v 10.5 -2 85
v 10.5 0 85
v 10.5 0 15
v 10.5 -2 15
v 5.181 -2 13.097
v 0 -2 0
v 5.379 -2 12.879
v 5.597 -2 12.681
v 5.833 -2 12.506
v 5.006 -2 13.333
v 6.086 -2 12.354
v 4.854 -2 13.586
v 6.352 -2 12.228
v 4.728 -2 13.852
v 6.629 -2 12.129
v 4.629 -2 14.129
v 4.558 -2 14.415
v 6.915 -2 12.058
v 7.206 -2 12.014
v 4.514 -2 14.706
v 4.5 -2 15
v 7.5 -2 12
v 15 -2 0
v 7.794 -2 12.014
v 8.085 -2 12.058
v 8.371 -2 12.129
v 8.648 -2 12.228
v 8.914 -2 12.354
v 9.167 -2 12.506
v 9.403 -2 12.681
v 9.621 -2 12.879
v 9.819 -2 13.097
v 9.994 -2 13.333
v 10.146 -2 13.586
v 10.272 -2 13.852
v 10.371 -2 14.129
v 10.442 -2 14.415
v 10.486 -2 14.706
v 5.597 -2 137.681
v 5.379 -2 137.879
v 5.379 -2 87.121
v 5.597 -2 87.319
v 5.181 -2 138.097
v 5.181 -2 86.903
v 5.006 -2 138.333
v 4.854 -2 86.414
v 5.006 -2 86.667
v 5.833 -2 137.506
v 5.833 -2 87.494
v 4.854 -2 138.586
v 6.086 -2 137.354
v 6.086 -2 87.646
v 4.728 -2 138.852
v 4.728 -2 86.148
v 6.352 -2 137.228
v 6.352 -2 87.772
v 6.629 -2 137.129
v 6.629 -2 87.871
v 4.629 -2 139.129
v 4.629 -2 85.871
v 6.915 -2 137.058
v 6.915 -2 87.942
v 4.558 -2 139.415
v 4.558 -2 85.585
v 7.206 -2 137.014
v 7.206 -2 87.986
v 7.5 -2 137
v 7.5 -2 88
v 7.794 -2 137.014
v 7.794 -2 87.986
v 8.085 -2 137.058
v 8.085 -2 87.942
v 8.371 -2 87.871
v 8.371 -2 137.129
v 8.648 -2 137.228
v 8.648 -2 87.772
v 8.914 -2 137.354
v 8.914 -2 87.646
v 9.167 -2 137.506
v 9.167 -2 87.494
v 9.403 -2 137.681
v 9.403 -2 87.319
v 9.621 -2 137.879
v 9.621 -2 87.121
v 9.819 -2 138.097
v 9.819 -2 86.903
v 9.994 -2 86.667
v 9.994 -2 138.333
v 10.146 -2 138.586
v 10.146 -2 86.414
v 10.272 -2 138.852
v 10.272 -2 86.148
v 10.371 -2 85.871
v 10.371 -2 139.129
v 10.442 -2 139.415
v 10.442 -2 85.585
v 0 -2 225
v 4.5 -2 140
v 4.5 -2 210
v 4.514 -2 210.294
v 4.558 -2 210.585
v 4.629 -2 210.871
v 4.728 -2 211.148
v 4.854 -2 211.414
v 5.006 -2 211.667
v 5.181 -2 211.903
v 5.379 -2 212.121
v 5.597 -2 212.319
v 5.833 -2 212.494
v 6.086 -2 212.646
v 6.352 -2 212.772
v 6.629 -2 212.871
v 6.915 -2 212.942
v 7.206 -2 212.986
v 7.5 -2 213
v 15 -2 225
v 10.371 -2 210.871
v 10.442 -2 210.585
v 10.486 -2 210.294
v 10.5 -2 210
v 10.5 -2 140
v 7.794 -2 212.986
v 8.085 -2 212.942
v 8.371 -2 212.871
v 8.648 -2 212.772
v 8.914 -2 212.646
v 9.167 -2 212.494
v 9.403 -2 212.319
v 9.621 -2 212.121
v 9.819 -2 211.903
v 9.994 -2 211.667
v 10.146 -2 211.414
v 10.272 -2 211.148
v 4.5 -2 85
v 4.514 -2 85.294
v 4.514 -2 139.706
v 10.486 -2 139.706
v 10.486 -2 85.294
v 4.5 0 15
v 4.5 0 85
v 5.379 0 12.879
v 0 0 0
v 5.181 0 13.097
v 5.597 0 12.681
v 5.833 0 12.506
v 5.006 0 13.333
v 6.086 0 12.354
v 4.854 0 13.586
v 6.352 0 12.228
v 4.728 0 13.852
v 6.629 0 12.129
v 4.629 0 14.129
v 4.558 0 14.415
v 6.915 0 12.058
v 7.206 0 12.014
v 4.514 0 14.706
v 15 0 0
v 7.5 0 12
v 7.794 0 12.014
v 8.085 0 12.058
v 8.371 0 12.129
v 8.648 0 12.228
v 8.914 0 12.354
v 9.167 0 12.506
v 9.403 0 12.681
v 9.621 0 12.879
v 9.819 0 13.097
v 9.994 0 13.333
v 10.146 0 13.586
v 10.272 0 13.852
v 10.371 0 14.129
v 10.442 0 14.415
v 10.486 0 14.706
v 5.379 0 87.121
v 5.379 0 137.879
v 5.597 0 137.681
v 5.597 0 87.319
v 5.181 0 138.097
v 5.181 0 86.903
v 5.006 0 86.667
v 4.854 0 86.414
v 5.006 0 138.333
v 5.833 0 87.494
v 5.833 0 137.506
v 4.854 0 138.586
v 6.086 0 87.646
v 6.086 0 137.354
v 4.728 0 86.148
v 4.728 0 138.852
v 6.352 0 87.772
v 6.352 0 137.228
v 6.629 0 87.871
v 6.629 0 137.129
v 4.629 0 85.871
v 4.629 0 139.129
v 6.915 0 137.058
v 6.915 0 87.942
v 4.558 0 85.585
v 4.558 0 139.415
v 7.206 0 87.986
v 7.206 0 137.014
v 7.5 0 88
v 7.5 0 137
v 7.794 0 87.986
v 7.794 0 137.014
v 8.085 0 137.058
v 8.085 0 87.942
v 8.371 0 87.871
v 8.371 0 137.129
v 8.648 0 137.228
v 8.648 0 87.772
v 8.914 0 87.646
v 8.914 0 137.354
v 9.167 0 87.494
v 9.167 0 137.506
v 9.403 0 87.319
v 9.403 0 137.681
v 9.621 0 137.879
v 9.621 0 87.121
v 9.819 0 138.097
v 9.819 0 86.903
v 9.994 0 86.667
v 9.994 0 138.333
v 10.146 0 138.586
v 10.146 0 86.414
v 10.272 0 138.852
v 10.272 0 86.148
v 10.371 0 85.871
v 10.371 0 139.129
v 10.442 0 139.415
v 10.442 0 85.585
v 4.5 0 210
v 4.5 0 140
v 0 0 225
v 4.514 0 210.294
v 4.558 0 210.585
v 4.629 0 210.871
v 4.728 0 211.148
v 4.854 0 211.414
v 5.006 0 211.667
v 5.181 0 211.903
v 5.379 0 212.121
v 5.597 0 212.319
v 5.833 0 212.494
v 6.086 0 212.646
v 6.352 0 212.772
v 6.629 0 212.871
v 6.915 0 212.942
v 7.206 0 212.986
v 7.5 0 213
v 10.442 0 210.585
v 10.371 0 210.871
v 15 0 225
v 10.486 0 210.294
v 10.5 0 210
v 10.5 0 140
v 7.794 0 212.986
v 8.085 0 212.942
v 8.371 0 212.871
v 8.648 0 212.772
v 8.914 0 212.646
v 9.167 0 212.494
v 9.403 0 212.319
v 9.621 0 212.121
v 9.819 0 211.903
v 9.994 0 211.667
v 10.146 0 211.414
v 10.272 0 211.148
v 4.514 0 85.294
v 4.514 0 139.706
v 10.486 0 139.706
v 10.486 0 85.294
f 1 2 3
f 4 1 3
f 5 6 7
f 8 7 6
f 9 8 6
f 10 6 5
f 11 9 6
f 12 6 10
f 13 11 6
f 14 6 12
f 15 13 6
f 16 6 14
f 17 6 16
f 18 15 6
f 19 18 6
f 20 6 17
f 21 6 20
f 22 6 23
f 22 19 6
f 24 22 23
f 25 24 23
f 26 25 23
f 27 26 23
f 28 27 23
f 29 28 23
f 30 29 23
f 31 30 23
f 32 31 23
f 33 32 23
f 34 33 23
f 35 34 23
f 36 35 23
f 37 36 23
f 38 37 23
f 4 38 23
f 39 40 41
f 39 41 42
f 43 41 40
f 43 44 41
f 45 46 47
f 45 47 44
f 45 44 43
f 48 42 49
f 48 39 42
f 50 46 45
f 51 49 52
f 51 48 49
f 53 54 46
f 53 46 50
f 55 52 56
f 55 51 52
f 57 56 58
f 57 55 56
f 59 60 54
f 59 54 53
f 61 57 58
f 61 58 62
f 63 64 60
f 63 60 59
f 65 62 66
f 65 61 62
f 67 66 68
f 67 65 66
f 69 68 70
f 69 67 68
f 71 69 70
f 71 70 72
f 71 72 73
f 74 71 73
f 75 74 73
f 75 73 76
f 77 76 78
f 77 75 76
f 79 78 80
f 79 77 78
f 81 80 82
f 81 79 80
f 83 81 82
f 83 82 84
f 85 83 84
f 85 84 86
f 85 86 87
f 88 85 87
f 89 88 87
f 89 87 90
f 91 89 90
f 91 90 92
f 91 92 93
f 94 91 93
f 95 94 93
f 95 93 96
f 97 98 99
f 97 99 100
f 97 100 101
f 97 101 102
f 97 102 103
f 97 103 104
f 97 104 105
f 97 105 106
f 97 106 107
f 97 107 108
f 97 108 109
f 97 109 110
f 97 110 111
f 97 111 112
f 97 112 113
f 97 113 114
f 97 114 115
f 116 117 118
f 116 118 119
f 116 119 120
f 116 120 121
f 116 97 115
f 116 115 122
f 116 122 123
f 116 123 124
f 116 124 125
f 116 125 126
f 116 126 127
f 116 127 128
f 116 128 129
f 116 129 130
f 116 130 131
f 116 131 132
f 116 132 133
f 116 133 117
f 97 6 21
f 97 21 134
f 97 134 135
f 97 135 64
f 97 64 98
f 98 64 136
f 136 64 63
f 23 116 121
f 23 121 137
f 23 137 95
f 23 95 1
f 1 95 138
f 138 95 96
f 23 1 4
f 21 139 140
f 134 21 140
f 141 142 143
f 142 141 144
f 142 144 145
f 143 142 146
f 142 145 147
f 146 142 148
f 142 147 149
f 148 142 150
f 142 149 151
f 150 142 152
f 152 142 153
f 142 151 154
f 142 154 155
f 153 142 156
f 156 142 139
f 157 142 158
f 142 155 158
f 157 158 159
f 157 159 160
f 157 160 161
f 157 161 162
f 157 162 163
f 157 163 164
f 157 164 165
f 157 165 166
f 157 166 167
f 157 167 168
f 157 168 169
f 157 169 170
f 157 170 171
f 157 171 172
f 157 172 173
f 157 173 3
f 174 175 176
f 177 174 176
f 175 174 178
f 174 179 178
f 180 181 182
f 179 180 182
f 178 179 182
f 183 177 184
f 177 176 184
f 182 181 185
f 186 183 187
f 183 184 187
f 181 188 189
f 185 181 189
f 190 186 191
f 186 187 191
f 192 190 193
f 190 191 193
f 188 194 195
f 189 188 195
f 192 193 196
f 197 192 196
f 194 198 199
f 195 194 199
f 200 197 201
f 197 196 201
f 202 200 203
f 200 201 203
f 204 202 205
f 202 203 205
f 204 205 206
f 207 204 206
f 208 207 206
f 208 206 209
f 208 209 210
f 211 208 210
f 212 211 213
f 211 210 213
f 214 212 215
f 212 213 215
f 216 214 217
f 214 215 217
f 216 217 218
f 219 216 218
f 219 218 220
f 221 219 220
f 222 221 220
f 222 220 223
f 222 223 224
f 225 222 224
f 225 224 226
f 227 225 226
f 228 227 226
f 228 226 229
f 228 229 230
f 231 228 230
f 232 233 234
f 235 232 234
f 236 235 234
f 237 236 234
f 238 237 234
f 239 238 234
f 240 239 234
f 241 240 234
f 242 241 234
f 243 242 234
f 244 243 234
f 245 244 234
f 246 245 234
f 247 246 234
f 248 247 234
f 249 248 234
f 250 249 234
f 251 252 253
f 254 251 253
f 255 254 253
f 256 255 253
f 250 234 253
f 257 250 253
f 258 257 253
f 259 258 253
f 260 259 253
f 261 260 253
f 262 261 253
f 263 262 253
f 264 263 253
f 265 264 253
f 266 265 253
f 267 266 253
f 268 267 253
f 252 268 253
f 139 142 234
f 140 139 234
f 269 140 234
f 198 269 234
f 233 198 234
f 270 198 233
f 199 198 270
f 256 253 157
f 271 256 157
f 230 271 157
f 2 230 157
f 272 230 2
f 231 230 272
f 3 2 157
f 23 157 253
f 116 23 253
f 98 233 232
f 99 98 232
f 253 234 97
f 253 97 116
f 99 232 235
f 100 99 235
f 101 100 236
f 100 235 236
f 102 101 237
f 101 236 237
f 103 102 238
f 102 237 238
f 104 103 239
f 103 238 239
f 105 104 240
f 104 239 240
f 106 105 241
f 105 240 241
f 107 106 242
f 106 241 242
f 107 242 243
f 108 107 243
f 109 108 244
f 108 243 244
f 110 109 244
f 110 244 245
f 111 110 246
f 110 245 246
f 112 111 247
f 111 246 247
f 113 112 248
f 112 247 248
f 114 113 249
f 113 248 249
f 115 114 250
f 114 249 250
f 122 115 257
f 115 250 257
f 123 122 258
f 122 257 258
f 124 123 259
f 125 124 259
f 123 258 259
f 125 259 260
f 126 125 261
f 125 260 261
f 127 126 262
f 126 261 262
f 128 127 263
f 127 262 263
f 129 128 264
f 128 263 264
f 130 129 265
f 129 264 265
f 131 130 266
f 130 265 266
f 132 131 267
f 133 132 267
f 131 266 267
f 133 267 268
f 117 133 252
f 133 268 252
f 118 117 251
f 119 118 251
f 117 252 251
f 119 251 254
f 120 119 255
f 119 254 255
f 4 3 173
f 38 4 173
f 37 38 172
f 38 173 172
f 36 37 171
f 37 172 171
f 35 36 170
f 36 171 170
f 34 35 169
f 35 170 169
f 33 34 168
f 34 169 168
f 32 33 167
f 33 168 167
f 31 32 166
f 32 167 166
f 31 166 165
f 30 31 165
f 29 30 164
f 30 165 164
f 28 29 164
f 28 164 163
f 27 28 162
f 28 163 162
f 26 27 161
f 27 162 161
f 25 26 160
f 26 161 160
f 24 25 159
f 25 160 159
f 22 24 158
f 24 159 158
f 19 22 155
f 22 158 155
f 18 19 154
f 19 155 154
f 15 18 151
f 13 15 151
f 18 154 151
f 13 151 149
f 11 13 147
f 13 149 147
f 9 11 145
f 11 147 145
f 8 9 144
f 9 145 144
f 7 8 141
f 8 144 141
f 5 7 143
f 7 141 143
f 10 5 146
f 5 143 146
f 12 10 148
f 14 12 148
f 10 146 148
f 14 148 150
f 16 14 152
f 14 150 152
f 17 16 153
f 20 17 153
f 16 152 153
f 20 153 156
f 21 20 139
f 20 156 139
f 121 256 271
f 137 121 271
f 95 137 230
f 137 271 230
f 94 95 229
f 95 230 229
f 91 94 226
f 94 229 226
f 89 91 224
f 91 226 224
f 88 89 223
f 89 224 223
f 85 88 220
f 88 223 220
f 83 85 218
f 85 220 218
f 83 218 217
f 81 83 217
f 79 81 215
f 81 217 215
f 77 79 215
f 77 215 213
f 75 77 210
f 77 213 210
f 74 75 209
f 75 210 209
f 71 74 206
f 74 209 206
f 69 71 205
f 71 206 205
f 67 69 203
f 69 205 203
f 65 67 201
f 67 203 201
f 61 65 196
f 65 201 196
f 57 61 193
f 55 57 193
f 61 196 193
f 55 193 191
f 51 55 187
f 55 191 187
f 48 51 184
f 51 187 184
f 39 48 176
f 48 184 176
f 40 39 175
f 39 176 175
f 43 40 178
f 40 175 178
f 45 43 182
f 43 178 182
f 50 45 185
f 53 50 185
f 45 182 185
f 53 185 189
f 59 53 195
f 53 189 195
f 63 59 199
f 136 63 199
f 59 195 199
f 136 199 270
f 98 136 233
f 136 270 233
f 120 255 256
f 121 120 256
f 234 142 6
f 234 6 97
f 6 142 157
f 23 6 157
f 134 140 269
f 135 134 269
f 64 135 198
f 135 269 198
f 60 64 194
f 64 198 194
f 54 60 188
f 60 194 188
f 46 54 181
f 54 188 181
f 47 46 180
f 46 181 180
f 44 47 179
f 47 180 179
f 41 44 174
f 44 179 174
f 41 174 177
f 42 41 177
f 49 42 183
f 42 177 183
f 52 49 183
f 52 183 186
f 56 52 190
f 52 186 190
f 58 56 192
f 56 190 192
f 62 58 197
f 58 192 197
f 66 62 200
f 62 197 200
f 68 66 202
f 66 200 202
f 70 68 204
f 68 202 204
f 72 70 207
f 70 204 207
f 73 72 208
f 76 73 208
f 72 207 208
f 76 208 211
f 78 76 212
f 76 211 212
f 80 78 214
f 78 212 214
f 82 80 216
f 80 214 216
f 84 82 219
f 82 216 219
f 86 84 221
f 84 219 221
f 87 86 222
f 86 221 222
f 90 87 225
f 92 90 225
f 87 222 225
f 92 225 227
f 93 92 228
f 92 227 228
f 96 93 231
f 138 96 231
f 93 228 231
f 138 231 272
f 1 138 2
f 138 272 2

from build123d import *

# Parameters (mm, degrees)
F0_W     = 15
F0_H     = 225
F1_DEPTH = 2


with BuildPart() as f1:
    # F0 (on Front) → F1 (new body)
    with BuildSketch(Plane.XZ):
        with Locations((7.5, 112.5)):
            Rectangle(F0_W, F0_H)
        with BuildLine():
            Line((4.5, 15), (4.5, 85))
            ThreePointArc((4.5, 85), (7.5, 88), (10.5, 85))
            Line((10.5, 85), (10.5, 15))
            ThreePointArc((10.5, 15), (7.5, 12), (4.5, 15))
        make_face(mode=Mode.SUBTRACT)
        with BuildLine():
            ThreePointArc((4.5, 210), (7.5, 213), (10.5, 210))
            Line((10.5, 210), (10.5, 140))
            ThreePointArc((10.5, 140), (7.5, 137), (4.5, 140))
            Line((4.5, 140), (4.5, 210))
        make_face(mode=Mode.SUBTRACT)
    extrude(amount=F1_DEPTH)


solid = f1.part
